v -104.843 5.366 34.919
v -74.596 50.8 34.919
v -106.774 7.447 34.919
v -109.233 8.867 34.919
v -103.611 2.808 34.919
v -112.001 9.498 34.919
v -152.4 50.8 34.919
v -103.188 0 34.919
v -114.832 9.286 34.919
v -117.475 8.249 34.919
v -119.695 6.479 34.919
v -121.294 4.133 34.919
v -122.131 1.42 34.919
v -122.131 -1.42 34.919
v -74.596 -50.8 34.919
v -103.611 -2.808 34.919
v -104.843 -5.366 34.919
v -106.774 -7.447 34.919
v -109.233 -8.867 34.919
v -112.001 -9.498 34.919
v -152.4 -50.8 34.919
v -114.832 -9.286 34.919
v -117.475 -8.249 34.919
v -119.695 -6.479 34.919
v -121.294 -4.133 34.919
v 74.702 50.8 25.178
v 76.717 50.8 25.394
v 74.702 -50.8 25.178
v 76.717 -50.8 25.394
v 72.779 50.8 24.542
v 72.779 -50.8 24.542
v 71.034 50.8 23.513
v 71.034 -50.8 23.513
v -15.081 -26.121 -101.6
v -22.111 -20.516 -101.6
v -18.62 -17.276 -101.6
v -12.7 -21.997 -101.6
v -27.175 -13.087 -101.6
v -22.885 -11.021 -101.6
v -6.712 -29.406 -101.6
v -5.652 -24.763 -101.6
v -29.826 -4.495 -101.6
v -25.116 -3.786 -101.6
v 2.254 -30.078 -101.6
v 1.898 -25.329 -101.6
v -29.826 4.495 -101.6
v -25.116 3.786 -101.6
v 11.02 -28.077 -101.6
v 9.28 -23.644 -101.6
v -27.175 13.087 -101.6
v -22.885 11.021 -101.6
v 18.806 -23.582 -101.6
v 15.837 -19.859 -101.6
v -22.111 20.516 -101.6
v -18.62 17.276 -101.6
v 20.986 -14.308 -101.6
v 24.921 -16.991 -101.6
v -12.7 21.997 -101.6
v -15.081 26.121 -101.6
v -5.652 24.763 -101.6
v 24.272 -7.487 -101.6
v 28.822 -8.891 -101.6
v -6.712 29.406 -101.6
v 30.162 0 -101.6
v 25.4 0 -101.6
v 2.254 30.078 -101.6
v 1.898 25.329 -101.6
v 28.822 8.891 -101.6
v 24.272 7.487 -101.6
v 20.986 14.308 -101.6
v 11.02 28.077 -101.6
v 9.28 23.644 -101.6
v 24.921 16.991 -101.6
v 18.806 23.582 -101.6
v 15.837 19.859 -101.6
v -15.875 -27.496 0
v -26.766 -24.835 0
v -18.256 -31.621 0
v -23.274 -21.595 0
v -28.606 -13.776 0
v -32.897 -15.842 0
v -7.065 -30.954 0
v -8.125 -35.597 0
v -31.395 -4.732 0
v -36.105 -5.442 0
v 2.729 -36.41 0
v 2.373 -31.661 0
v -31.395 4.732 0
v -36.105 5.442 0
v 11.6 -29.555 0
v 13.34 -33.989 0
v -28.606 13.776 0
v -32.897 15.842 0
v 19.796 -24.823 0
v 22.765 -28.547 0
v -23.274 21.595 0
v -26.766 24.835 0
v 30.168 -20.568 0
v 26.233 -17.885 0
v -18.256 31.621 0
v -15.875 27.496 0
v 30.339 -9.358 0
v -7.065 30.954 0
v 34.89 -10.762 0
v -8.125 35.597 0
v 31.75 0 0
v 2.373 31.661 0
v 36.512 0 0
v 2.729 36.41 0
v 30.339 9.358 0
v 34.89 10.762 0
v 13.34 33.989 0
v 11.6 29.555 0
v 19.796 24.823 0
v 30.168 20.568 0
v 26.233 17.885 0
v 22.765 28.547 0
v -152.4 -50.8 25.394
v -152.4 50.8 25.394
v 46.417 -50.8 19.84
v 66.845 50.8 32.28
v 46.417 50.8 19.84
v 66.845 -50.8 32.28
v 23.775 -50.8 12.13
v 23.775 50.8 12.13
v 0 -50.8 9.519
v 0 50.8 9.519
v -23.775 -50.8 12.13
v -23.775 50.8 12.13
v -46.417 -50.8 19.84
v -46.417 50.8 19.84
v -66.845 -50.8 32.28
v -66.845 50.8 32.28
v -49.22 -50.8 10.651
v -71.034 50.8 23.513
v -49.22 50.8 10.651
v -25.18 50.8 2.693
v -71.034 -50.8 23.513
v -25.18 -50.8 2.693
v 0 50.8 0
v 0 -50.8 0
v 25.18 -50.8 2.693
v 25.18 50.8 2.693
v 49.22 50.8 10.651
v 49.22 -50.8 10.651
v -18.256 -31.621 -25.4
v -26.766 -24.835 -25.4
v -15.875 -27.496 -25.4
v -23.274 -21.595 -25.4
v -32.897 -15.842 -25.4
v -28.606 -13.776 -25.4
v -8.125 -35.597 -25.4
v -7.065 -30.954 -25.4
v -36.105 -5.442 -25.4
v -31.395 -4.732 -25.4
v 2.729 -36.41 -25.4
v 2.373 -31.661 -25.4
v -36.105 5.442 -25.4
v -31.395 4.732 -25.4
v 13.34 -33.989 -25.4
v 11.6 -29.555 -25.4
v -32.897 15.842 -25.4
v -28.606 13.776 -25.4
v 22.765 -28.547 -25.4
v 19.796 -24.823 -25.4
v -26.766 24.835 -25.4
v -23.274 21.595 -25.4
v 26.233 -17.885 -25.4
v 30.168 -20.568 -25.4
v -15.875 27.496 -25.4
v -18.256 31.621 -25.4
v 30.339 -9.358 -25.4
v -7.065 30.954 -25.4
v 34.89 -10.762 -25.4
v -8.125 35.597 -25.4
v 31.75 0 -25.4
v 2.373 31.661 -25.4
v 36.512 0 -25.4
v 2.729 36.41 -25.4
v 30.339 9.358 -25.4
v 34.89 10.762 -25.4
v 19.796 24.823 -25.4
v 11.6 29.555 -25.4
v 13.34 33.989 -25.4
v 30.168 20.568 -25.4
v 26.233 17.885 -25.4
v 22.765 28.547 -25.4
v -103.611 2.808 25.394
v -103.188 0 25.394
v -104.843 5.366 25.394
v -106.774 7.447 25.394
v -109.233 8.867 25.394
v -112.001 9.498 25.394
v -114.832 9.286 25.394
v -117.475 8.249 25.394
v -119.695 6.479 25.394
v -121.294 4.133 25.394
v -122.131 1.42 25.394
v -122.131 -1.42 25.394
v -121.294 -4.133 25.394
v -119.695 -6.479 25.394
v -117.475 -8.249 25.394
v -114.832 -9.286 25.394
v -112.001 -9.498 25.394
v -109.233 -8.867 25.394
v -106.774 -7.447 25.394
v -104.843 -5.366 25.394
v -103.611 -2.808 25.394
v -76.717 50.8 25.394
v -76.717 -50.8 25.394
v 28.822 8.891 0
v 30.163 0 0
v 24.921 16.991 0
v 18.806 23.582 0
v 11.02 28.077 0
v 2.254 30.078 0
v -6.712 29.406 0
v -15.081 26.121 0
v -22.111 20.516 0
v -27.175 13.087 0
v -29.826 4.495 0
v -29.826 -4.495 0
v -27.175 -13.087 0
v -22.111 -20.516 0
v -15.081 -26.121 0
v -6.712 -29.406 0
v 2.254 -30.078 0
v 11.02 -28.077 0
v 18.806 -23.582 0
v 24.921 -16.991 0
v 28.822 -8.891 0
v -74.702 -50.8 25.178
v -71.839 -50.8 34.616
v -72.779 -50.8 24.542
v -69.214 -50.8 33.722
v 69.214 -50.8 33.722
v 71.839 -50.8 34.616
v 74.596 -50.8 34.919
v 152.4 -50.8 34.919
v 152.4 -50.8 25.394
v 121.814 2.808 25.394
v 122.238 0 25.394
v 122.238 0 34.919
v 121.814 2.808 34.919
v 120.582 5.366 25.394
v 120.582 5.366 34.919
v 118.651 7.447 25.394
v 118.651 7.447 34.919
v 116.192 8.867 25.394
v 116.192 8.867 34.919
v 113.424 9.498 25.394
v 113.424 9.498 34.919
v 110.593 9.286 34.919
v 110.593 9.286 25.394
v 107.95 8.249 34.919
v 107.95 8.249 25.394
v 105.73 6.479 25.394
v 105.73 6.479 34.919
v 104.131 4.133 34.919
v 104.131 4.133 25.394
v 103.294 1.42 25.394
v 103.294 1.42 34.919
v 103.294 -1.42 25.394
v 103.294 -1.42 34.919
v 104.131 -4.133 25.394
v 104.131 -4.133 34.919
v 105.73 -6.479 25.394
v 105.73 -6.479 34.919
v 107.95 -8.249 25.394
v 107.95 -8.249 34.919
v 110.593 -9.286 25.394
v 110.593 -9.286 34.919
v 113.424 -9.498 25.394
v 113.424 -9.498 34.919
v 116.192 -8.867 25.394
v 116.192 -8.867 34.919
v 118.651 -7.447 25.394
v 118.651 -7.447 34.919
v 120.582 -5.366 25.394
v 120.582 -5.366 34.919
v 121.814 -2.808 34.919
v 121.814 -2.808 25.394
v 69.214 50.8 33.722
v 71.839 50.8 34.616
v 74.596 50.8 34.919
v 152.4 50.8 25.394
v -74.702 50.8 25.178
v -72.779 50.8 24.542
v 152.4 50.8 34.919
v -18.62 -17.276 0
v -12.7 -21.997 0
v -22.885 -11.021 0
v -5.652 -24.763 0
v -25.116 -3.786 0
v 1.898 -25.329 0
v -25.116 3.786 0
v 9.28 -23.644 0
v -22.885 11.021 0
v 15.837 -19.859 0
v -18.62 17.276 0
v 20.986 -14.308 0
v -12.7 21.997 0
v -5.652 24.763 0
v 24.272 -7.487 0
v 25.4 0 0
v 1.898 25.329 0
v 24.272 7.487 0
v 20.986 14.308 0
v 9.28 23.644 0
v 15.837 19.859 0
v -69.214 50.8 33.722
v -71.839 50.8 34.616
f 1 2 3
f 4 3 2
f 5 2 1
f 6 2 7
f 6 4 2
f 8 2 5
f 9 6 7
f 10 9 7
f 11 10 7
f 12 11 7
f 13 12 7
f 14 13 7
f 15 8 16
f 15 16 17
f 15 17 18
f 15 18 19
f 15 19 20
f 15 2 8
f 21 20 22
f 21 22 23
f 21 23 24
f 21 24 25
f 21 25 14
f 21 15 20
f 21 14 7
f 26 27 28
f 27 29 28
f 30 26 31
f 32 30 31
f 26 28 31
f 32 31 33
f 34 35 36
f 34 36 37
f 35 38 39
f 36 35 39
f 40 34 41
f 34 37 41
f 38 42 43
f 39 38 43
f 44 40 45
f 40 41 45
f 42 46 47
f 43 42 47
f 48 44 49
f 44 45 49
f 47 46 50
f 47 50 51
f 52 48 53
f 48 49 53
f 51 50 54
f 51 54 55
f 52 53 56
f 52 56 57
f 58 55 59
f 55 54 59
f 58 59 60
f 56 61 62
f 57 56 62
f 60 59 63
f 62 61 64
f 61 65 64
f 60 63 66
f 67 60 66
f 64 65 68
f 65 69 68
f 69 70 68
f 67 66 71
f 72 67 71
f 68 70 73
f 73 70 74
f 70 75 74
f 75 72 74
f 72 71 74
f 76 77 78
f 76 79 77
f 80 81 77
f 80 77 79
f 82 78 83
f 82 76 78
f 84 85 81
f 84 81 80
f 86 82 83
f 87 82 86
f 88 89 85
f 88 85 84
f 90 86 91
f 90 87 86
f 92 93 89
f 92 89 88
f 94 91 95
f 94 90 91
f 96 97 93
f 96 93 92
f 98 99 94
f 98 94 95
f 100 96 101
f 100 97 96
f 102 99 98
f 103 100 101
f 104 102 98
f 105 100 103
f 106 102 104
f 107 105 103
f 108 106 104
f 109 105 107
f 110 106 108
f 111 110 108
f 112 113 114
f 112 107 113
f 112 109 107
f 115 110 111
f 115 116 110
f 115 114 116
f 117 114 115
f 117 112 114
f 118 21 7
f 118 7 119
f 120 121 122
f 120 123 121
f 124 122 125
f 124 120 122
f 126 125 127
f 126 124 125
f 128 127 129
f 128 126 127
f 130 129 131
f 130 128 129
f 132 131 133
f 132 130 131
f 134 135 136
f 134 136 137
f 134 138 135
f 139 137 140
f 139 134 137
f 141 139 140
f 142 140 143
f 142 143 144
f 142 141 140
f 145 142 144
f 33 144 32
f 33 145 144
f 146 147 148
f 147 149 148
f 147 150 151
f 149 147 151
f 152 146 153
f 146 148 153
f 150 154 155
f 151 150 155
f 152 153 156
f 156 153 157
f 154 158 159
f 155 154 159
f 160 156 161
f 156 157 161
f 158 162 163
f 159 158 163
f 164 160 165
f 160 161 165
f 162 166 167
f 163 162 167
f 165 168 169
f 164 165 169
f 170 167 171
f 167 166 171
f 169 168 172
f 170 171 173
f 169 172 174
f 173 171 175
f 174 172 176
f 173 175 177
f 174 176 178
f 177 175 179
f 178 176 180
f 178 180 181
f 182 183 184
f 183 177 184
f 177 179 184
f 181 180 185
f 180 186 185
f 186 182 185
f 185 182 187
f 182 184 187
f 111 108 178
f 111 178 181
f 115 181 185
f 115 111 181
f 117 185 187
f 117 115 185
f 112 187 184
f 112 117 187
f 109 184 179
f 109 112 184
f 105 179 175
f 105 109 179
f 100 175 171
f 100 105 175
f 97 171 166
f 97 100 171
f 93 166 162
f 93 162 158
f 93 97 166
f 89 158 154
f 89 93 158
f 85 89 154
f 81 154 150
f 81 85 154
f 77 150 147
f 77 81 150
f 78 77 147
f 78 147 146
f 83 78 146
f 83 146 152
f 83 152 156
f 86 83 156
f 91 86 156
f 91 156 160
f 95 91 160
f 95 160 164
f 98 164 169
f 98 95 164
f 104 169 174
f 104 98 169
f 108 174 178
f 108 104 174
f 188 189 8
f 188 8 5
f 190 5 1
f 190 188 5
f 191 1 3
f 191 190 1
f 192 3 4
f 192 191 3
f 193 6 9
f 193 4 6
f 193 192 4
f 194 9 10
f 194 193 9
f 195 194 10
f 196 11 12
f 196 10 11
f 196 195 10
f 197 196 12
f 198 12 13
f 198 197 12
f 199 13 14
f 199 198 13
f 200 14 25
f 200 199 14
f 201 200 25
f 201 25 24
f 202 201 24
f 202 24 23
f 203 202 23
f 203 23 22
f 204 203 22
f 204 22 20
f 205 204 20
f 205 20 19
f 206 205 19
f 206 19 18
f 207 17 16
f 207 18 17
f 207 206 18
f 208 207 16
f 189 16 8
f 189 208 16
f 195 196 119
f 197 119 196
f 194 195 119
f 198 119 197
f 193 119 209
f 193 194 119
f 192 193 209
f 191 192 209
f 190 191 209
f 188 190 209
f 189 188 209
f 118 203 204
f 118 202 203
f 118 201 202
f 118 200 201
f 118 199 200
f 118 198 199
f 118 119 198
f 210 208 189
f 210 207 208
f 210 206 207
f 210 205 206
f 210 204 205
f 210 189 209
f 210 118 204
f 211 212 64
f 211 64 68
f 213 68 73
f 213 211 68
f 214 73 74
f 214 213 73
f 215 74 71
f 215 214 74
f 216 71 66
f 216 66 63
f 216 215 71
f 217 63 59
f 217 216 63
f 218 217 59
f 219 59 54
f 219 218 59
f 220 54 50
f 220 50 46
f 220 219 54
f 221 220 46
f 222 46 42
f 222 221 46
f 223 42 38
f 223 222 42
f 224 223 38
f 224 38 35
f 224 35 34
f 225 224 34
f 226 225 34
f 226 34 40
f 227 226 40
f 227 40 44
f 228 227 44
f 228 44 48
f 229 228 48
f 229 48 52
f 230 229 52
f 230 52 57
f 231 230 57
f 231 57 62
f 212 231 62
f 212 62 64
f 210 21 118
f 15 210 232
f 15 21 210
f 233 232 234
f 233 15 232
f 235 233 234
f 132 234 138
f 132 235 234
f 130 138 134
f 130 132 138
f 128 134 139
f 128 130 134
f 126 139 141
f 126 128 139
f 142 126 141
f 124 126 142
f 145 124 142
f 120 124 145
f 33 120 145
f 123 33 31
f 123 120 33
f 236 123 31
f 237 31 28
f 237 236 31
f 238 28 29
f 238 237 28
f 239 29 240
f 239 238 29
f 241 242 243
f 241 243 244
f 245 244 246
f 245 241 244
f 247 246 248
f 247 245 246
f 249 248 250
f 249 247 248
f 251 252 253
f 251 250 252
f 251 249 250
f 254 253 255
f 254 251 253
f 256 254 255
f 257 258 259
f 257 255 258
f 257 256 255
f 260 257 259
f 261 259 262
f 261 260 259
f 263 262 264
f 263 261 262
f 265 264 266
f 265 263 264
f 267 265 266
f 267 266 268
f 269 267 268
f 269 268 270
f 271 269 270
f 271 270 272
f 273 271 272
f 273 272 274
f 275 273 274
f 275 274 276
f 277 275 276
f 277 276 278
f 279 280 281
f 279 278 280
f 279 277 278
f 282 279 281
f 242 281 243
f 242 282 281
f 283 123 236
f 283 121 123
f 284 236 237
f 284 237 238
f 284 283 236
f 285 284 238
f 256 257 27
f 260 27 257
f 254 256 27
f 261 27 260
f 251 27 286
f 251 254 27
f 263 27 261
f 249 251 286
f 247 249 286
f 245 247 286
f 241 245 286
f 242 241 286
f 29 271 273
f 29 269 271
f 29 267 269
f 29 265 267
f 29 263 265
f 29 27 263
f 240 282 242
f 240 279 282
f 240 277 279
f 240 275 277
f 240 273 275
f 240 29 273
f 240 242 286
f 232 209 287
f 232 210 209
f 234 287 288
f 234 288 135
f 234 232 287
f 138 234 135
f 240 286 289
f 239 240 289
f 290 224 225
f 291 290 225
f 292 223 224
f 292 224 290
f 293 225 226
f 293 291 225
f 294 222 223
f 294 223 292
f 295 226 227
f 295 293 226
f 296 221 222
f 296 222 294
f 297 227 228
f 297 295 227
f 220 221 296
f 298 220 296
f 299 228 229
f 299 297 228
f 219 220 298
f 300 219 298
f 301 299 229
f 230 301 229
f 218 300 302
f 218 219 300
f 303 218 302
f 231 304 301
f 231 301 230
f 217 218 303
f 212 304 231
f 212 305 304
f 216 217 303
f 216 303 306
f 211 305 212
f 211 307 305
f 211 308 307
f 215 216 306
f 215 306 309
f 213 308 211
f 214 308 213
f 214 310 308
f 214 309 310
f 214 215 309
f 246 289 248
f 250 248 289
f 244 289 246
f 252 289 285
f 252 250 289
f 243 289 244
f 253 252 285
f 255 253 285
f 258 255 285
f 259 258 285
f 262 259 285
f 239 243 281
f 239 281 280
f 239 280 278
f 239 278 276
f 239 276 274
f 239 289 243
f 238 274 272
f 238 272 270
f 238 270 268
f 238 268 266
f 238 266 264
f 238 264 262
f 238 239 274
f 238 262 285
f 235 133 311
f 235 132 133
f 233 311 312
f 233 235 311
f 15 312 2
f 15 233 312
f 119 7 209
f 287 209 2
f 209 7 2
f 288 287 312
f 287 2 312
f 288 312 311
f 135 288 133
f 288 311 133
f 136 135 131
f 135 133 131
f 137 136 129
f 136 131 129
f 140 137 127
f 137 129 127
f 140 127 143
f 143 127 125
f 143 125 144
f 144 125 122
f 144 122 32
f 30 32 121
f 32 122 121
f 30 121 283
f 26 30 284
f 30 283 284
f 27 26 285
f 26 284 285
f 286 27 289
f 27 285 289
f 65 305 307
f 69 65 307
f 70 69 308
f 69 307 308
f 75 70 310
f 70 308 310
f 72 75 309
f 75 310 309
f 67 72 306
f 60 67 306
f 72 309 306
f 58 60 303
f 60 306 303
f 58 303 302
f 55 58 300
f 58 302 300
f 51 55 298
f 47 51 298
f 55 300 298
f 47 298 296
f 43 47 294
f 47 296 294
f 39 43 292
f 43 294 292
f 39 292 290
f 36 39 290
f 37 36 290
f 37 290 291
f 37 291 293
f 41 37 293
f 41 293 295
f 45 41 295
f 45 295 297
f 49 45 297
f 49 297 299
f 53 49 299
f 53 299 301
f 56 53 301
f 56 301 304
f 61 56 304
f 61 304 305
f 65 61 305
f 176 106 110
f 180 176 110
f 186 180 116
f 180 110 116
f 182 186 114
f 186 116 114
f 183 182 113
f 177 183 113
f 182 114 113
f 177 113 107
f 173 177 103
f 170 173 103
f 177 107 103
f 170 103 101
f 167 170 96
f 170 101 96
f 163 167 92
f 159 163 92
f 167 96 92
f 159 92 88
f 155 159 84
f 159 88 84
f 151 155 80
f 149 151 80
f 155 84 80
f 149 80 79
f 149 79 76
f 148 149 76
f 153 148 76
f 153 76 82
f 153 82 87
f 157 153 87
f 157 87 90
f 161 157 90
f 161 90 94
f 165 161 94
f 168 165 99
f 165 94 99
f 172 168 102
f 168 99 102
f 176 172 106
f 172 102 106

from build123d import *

# Parameters (mm, degrees)
F0_R     = 30.1625
F0_R_2   = 25.4
F1_DEPTH = 25.4
F2_DEPTH = 101.6
F0_R_3   = 36.5125
F0_R_4   = 31.75
F3_DEPTH = 25.4
F5_DEPTH = 50.8
F6_R     = 12.7
F7_R     = 9.525
F8_R     = 9.525
F9_DEPTH = 34.919747


with BuildPart() as f1:
    # F0 (on Top) → F1 (new body)
    with BuildSketch(Plane.XY):
        Circle(F0_R)
        Circle(F0_R_2, mode=Mode.SUBTRACT)
    extrude(amount=-F1_DEPTH)

    # F0 (on Top) → F2 (join)
    with BuildSketch(Plane.XY):
        Circle(F0_R)
        Circle(F0_R_2, mode=Mode.SUBTRACT)
    extrude(amount=-F2_DEPTH)


with BuildPart() as f3:
    # F0 (on Top) → F3 (new body)
    with BuildSketch(Plane.XY):
        Circle(F0_R_3)
        Circle(F0_R_4, mode=Mode.SUBTRACT)
    extrude(amount=-F3_DEPTH)


with BuildPart() as f5:
    # F4 (on Front) → F5 (new body, symmetric)
    with BuildSketch(Plane.XZ):
        with BuildLine():
            ThreePointArc((70.138042, 34.918747), (0, 9.518747), (-70.138042, 34.918747))
            Line((-70.138042, 34.918747), (-152.4, 34.918747))
            Line((-152.4, 34.918747), (-152.4, 25.393747))
            Line((-152.4, 25.393747), (-73.496435, 25.393747))
            ThreePointArc((-73.496435, 25.393747), (0, 0), (73.496435, 25.393747))
            Line((73.496435, 25.393747), (152.4, 25.393747))
            Line((152.4, 25.393747), (152.4, 34.918747))
            Line((152.4, 34.918747), (70.138042, 34.918747))
        make_face()
    extrude(amount=F5_DEPTH, both=True)

    # F6
    f6_edges = [f5.edges().sort_by_distance(p)[0] for p in [
        (70.138042, 0, 34.918747),
        (-70.138042, 0, 34.918747),
    ]]
    fillet(f6_edges, radius=F6_R)

    # F7
    f7_edges = [f5.edges().sort_by_distance(p)[0] for p in [
        (-73.496435, 0, 25.393747),
        (73.496435, 0, 25.393747),
    ]]
    fillet(f7_edges, radius=F7_R)

    # F8 (on Top) → F9 (cut, through all)
    with BuildSketch(Plane.XY):
        with Locations((-112.7125, 0)):
            Circle(F8_R)
        with Locations((112.7125, 0)):
            Circle(F8_R)
    extrude(amount=F9_DEPTH, mode=Mode.SUBTRACT)


solid = Compound([f1.part, f3.part, f5.part])
